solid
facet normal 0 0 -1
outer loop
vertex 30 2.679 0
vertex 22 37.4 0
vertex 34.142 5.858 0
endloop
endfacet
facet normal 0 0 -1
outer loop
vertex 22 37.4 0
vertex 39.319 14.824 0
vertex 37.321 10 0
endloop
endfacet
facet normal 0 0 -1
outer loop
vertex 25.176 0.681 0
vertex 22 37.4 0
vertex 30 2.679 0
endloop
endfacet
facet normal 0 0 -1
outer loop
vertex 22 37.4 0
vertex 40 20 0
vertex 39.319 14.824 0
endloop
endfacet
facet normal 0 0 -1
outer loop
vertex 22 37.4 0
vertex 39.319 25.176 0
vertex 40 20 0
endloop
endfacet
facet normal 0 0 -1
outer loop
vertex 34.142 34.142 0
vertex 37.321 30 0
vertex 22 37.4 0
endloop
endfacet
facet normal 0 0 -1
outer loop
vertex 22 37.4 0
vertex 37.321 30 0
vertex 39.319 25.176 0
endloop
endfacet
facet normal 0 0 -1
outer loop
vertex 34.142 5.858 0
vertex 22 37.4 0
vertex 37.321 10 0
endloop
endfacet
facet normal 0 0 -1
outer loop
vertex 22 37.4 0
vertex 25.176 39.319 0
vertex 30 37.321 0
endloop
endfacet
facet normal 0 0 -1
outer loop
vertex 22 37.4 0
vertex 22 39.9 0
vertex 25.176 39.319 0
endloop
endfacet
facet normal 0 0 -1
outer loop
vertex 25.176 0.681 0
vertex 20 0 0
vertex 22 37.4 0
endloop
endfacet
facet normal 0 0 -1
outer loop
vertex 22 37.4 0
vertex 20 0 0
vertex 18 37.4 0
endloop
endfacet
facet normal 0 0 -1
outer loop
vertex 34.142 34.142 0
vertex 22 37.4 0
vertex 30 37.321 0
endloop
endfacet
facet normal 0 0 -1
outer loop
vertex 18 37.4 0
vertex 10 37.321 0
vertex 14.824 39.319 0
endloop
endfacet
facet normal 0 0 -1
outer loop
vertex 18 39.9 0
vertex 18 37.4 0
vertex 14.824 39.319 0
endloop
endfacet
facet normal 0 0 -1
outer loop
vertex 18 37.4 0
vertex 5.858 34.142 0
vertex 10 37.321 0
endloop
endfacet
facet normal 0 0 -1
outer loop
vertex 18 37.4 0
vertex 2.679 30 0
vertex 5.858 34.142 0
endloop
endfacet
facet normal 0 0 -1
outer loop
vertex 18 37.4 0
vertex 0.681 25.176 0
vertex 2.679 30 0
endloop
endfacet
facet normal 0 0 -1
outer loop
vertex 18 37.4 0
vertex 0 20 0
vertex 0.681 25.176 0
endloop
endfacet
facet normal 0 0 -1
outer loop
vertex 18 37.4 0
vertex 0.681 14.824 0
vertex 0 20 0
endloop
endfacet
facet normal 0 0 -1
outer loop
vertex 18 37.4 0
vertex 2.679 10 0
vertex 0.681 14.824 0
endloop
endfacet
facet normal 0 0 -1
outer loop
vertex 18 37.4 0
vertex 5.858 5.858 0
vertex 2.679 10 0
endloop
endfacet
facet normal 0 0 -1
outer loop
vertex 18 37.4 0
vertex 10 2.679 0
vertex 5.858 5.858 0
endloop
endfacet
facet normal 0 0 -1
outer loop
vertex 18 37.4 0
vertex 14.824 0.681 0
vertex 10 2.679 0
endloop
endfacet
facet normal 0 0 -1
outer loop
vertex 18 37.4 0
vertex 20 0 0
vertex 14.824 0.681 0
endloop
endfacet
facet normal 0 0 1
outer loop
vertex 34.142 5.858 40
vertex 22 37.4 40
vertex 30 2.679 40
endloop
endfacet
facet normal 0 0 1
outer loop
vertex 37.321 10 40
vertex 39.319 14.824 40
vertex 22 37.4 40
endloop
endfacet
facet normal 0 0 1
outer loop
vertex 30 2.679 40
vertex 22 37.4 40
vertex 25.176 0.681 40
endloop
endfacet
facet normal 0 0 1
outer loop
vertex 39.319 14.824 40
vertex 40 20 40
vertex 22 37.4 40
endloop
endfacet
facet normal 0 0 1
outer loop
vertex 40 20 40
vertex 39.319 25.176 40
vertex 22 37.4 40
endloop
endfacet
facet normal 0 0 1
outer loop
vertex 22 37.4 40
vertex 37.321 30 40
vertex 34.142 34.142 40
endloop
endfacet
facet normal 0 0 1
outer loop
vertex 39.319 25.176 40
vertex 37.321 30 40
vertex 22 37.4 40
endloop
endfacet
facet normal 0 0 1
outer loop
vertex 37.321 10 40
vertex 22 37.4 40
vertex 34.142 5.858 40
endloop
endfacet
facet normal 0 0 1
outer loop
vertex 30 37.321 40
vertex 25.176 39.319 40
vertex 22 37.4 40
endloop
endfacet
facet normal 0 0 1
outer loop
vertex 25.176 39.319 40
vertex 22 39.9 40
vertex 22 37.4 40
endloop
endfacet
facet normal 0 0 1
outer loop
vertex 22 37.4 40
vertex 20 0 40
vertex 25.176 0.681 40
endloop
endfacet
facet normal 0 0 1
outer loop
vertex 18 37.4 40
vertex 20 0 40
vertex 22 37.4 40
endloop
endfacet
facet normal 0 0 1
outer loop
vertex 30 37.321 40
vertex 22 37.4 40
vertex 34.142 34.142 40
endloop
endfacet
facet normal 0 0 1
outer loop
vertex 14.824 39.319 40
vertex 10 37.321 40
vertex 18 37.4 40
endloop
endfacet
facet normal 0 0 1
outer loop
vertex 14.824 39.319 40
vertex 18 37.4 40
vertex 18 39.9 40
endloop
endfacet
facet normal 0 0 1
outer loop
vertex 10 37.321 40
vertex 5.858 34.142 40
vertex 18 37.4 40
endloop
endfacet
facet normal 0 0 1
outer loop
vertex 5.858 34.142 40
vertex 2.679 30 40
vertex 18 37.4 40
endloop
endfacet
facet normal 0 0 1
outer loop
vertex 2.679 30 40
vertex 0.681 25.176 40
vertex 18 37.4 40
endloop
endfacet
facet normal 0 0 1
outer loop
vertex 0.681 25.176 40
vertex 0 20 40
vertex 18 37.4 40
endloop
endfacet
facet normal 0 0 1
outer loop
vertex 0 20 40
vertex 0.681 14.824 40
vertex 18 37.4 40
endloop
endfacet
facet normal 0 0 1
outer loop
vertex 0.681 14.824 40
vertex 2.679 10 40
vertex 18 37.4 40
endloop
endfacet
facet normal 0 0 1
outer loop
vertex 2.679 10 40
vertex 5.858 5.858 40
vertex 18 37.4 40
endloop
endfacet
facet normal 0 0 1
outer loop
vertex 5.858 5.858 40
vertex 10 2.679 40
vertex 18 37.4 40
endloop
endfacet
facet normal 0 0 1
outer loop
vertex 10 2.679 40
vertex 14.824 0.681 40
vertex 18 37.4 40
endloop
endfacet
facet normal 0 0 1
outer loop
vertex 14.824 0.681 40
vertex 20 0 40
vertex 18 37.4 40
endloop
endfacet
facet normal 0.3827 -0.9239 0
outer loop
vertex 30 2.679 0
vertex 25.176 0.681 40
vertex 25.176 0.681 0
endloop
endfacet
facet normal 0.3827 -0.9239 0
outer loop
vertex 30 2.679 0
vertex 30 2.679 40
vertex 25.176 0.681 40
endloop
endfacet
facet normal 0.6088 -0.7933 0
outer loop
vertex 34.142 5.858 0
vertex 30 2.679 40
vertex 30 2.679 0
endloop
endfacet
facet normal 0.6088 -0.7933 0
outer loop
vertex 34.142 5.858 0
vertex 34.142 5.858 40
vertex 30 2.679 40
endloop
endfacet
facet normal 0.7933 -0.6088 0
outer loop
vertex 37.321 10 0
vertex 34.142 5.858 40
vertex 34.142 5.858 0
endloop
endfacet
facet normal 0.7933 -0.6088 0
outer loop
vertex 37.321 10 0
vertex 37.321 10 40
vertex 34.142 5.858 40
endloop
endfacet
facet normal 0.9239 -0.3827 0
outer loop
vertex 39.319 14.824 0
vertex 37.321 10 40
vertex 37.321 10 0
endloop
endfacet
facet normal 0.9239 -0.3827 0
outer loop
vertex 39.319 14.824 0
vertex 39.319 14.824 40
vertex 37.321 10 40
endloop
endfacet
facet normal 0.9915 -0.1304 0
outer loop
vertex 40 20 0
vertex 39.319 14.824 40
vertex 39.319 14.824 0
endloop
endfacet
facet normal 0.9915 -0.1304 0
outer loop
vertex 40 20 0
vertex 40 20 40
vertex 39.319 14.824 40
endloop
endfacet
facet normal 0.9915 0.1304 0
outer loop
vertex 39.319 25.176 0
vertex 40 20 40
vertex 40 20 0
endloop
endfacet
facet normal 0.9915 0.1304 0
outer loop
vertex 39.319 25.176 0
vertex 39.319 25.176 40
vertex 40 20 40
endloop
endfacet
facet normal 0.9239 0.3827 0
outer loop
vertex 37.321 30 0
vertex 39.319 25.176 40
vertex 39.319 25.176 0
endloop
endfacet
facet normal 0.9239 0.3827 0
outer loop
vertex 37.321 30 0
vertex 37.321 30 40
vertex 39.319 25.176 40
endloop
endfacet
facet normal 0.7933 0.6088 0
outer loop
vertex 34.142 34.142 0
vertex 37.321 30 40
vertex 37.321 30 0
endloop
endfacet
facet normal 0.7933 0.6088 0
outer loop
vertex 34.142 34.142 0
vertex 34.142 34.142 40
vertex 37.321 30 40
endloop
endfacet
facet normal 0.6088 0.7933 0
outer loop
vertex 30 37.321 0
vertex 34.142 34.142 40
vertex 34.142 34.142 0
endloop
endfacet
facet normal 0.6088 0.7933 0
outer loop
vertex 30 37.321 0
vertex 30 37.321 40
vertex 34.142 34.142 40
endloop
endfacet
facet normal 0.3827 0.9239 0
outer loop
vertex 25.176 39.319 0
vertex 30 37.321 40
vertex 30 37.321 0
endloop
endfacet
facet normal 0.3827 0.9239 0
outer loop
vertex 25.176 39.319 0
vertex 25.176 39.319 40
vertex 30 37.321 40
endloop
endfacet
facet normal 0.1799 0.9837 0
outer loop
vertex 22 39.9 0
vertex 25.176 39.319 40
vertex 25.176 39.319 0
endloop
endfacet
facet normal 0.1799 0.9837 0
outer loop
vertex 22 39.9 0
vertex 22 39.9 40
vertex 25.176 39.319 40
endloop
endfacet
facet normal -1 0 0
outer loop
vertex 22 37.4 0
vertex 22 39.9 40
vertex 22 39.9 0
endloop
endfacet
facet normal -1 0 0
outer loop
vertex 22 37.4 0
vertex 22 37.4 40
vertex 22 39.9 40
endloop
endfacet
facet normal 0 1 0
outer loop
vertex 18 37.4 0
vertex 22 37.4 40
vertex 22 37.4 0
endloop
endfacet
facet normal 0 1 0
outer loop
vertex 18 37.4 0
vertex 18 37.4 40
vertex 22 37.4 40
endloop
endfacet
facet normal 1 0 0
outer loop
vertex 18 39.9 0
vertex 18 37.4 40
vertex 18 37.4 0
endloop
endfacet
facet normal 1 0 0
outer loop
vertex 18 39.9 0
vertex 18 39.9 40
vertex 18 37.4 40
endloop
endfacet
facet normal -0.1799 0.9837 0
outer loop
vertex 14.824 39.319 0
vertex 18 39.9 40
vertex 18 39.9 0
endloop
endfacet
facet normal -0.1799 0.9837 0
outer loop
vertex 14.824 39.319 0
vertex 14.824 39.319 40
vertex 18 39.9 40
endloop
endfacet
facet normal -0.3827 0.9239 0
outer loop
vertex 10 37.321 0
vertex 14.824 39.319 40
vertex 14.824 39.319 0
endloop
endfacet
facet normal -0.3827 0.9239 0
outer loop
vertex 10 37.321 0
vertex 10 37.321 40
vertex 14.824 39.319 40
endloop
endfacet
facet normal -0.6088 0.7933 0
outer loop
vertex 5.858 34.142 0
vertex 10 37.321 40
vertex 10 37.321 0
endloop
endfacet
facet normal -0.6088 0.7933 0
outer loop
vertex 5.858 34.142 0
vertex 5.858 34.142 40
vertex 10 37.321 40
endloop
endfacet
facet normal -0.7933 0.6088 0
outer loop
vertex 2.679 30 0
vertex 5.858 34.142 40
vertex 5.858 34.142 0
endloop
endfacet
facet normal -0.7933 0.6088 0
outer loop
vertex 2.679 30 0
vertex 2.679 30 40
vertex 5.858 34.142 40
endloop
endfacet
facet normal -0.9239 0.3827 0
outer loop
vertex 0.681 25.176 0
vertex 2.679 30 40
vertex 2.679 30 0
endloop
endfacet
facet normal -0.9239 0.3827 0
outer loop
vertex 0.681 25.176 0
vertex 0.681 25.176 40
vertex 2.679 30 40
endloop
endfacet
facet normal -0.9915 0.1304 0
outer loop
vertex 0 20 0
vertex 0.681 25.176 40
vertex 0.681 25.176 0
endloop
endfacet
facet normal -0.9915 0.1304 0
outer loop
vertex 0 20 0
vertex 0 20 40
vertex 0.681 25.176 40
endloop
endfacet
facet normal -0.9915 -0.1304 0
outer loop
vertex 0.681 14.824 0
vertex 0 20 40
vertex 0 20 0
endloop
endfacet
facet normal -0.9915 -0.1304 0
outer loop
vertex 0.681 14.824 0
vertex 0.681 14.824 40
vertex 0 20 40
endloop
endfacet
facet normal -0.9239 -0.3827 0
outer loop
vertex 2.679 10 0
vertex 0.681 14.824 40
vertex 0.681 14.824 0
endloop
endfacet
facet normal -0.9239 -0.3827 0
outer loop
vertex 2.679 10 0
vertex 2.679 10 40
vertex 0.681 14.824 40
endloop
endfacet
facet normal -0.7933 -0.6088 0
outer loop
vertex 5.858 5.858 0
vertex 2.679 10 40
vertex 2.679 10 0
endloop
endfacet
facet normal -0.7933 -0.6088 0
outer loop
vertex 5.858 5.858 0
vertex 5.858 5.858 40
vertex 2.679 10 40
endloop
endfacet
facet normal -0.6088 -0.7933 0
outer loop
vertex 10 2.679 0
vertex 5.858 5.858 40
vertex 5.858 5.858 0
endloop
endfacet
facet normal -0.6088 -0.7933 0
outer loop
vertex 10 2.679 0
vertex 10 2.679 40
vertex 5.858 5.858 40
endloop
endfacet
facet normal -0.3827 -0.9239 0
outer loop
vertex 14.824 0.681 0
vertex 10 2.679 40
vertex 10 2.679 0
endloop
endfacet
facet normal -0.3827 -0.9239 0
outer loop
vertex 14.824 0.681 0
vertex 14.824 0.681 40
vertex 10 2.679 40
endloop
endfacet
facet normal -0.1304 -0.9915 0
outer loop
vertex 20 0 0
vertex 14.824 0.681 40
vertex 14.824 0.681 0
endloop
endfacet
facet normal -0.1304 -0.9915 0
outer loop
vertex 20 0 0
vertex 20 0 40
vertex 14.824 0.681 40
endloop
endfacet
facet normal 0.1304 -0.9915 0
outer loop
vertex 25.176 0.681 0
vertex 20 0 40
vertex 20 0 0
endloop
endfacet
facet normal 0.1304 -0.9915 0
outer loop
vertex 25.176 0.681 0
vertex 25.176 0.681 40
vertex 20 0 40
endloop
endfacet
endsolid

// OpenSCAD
$fn = 32;

// ----------------------------------------------------------------------
// Keyway shaft: d40 shaft, key 4 x 2.5 mm
// ----------------------------------------------------------------------

// --- parameters (mm) ---
shaft_r = 20;             // shaft radius
key_w = 4;                // keyway width
key_d = 2.5;              // keyway depth below the surface line
plate_t = 40;             // shaft length, Z (extrusion height)

shaft_d = 2 * shaft_r;  // shaft diameter
circle_step = 15;  // polygon sampling step, degrees

profile = [[14.824, 39.319], [10, 37.321], [5.858, 34.142], [2.679, 30], [0.681, 25.176], [0, 20], [0.681, 14.824], [2.679, 10], [5.858, 5.858], [10, 2.679], [14.824, 0.681], [20, 0], [25.176, 0.681], [30, 2.679], [34.142, 5.858], [37.321, 10], [39.319, 14.824], [40, 20], [39.319, 25.176], [37.321, 30], [34.142, 34.142], [30, 37.321], [25.176, 39.319], [22, 39.9], [22, 37.4], [18, 37.4], [18, 39.9]];  // primary outline, 27 points, counter clockwise

// --- the one profile operation ---
linear_extrude(height = plate_t) polygon(points = profile);
